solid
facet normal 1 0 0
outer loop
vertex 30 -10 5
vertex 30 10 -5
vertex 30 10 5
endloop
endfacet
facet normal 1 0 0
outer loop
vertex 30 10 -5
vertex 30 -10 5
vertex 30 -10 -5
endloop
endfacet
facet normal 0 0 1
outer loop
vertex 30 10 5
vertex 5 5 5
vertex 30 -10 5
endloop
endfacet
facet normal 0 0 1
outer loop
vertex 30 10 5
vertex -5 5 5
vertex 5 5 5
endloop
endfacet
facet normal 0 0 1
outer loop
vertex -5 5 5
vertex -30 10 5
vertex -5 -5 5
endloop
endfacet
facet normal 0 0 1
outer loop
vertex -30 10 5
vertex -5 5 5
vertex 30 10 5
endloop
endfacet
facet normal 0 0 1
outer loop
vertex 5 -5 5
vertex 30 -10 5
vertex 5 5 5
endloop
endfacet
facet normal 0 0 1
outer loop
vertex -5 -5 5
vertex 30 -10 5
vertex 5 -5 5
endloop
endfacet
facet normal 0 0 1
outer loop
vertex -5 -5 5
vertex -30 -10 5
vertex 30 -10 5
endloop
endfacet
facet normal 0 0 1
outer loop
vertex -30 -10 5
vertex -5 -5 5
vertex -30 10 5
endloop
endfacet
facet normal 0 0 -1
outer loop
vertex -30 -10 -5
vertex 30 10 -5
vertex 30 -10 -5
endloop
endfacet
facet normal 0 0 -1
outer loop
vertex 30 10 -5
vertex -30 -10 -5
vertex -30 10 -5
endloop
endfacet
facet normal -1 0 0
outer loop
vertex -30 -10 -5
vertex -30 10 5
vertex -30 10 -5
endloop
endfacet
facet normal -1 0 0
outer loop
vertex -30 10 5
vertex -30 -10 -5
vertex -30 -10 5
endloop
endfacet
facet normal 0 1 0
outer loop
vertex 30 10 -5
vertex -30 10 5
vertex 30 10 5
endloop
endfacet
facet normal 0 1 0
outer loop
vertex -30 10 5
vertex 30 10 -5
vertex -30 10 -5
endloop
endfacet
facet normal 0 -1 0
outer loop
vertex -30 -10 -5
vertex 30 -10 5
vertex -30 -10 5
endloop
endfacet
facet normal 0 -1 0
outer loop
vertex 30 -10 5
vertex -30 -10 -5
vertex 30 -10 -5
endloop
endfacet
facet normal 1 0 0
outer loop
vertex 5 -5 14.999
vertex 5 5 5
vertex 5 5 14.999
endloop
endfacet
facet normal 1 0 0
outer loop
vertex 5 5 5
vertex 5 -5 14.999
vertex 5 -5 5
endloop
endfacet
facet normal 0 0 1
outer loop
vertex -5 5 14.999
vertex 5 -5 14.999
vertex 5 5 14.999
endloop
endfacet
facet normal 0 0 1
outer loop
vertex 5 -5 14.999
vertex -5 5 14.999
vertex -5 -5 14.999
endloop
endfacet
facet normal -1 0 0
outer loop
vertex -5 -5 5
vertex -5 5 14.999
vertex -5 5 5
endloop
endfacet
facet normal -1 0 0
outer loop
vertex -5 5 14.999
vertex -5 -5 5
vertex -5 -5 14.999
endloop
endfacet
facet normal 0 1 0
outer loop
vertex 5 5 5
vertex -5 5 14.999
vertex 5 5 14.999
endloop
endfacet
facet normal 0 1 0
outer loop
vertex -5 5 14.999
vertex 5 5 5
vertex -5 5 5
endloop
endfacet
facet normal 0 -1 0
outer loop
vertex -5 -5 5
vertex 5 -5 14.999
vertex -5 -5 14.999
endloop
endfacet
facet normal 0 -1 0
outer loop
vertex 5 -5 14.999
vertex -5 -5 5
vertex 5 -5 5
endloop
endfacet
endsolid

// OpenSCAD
cube([60, 20, 10], center = true);

translate([0, 0, 9.999])   //To differentiate between the 2 cubes
    cube(10, center = true);
